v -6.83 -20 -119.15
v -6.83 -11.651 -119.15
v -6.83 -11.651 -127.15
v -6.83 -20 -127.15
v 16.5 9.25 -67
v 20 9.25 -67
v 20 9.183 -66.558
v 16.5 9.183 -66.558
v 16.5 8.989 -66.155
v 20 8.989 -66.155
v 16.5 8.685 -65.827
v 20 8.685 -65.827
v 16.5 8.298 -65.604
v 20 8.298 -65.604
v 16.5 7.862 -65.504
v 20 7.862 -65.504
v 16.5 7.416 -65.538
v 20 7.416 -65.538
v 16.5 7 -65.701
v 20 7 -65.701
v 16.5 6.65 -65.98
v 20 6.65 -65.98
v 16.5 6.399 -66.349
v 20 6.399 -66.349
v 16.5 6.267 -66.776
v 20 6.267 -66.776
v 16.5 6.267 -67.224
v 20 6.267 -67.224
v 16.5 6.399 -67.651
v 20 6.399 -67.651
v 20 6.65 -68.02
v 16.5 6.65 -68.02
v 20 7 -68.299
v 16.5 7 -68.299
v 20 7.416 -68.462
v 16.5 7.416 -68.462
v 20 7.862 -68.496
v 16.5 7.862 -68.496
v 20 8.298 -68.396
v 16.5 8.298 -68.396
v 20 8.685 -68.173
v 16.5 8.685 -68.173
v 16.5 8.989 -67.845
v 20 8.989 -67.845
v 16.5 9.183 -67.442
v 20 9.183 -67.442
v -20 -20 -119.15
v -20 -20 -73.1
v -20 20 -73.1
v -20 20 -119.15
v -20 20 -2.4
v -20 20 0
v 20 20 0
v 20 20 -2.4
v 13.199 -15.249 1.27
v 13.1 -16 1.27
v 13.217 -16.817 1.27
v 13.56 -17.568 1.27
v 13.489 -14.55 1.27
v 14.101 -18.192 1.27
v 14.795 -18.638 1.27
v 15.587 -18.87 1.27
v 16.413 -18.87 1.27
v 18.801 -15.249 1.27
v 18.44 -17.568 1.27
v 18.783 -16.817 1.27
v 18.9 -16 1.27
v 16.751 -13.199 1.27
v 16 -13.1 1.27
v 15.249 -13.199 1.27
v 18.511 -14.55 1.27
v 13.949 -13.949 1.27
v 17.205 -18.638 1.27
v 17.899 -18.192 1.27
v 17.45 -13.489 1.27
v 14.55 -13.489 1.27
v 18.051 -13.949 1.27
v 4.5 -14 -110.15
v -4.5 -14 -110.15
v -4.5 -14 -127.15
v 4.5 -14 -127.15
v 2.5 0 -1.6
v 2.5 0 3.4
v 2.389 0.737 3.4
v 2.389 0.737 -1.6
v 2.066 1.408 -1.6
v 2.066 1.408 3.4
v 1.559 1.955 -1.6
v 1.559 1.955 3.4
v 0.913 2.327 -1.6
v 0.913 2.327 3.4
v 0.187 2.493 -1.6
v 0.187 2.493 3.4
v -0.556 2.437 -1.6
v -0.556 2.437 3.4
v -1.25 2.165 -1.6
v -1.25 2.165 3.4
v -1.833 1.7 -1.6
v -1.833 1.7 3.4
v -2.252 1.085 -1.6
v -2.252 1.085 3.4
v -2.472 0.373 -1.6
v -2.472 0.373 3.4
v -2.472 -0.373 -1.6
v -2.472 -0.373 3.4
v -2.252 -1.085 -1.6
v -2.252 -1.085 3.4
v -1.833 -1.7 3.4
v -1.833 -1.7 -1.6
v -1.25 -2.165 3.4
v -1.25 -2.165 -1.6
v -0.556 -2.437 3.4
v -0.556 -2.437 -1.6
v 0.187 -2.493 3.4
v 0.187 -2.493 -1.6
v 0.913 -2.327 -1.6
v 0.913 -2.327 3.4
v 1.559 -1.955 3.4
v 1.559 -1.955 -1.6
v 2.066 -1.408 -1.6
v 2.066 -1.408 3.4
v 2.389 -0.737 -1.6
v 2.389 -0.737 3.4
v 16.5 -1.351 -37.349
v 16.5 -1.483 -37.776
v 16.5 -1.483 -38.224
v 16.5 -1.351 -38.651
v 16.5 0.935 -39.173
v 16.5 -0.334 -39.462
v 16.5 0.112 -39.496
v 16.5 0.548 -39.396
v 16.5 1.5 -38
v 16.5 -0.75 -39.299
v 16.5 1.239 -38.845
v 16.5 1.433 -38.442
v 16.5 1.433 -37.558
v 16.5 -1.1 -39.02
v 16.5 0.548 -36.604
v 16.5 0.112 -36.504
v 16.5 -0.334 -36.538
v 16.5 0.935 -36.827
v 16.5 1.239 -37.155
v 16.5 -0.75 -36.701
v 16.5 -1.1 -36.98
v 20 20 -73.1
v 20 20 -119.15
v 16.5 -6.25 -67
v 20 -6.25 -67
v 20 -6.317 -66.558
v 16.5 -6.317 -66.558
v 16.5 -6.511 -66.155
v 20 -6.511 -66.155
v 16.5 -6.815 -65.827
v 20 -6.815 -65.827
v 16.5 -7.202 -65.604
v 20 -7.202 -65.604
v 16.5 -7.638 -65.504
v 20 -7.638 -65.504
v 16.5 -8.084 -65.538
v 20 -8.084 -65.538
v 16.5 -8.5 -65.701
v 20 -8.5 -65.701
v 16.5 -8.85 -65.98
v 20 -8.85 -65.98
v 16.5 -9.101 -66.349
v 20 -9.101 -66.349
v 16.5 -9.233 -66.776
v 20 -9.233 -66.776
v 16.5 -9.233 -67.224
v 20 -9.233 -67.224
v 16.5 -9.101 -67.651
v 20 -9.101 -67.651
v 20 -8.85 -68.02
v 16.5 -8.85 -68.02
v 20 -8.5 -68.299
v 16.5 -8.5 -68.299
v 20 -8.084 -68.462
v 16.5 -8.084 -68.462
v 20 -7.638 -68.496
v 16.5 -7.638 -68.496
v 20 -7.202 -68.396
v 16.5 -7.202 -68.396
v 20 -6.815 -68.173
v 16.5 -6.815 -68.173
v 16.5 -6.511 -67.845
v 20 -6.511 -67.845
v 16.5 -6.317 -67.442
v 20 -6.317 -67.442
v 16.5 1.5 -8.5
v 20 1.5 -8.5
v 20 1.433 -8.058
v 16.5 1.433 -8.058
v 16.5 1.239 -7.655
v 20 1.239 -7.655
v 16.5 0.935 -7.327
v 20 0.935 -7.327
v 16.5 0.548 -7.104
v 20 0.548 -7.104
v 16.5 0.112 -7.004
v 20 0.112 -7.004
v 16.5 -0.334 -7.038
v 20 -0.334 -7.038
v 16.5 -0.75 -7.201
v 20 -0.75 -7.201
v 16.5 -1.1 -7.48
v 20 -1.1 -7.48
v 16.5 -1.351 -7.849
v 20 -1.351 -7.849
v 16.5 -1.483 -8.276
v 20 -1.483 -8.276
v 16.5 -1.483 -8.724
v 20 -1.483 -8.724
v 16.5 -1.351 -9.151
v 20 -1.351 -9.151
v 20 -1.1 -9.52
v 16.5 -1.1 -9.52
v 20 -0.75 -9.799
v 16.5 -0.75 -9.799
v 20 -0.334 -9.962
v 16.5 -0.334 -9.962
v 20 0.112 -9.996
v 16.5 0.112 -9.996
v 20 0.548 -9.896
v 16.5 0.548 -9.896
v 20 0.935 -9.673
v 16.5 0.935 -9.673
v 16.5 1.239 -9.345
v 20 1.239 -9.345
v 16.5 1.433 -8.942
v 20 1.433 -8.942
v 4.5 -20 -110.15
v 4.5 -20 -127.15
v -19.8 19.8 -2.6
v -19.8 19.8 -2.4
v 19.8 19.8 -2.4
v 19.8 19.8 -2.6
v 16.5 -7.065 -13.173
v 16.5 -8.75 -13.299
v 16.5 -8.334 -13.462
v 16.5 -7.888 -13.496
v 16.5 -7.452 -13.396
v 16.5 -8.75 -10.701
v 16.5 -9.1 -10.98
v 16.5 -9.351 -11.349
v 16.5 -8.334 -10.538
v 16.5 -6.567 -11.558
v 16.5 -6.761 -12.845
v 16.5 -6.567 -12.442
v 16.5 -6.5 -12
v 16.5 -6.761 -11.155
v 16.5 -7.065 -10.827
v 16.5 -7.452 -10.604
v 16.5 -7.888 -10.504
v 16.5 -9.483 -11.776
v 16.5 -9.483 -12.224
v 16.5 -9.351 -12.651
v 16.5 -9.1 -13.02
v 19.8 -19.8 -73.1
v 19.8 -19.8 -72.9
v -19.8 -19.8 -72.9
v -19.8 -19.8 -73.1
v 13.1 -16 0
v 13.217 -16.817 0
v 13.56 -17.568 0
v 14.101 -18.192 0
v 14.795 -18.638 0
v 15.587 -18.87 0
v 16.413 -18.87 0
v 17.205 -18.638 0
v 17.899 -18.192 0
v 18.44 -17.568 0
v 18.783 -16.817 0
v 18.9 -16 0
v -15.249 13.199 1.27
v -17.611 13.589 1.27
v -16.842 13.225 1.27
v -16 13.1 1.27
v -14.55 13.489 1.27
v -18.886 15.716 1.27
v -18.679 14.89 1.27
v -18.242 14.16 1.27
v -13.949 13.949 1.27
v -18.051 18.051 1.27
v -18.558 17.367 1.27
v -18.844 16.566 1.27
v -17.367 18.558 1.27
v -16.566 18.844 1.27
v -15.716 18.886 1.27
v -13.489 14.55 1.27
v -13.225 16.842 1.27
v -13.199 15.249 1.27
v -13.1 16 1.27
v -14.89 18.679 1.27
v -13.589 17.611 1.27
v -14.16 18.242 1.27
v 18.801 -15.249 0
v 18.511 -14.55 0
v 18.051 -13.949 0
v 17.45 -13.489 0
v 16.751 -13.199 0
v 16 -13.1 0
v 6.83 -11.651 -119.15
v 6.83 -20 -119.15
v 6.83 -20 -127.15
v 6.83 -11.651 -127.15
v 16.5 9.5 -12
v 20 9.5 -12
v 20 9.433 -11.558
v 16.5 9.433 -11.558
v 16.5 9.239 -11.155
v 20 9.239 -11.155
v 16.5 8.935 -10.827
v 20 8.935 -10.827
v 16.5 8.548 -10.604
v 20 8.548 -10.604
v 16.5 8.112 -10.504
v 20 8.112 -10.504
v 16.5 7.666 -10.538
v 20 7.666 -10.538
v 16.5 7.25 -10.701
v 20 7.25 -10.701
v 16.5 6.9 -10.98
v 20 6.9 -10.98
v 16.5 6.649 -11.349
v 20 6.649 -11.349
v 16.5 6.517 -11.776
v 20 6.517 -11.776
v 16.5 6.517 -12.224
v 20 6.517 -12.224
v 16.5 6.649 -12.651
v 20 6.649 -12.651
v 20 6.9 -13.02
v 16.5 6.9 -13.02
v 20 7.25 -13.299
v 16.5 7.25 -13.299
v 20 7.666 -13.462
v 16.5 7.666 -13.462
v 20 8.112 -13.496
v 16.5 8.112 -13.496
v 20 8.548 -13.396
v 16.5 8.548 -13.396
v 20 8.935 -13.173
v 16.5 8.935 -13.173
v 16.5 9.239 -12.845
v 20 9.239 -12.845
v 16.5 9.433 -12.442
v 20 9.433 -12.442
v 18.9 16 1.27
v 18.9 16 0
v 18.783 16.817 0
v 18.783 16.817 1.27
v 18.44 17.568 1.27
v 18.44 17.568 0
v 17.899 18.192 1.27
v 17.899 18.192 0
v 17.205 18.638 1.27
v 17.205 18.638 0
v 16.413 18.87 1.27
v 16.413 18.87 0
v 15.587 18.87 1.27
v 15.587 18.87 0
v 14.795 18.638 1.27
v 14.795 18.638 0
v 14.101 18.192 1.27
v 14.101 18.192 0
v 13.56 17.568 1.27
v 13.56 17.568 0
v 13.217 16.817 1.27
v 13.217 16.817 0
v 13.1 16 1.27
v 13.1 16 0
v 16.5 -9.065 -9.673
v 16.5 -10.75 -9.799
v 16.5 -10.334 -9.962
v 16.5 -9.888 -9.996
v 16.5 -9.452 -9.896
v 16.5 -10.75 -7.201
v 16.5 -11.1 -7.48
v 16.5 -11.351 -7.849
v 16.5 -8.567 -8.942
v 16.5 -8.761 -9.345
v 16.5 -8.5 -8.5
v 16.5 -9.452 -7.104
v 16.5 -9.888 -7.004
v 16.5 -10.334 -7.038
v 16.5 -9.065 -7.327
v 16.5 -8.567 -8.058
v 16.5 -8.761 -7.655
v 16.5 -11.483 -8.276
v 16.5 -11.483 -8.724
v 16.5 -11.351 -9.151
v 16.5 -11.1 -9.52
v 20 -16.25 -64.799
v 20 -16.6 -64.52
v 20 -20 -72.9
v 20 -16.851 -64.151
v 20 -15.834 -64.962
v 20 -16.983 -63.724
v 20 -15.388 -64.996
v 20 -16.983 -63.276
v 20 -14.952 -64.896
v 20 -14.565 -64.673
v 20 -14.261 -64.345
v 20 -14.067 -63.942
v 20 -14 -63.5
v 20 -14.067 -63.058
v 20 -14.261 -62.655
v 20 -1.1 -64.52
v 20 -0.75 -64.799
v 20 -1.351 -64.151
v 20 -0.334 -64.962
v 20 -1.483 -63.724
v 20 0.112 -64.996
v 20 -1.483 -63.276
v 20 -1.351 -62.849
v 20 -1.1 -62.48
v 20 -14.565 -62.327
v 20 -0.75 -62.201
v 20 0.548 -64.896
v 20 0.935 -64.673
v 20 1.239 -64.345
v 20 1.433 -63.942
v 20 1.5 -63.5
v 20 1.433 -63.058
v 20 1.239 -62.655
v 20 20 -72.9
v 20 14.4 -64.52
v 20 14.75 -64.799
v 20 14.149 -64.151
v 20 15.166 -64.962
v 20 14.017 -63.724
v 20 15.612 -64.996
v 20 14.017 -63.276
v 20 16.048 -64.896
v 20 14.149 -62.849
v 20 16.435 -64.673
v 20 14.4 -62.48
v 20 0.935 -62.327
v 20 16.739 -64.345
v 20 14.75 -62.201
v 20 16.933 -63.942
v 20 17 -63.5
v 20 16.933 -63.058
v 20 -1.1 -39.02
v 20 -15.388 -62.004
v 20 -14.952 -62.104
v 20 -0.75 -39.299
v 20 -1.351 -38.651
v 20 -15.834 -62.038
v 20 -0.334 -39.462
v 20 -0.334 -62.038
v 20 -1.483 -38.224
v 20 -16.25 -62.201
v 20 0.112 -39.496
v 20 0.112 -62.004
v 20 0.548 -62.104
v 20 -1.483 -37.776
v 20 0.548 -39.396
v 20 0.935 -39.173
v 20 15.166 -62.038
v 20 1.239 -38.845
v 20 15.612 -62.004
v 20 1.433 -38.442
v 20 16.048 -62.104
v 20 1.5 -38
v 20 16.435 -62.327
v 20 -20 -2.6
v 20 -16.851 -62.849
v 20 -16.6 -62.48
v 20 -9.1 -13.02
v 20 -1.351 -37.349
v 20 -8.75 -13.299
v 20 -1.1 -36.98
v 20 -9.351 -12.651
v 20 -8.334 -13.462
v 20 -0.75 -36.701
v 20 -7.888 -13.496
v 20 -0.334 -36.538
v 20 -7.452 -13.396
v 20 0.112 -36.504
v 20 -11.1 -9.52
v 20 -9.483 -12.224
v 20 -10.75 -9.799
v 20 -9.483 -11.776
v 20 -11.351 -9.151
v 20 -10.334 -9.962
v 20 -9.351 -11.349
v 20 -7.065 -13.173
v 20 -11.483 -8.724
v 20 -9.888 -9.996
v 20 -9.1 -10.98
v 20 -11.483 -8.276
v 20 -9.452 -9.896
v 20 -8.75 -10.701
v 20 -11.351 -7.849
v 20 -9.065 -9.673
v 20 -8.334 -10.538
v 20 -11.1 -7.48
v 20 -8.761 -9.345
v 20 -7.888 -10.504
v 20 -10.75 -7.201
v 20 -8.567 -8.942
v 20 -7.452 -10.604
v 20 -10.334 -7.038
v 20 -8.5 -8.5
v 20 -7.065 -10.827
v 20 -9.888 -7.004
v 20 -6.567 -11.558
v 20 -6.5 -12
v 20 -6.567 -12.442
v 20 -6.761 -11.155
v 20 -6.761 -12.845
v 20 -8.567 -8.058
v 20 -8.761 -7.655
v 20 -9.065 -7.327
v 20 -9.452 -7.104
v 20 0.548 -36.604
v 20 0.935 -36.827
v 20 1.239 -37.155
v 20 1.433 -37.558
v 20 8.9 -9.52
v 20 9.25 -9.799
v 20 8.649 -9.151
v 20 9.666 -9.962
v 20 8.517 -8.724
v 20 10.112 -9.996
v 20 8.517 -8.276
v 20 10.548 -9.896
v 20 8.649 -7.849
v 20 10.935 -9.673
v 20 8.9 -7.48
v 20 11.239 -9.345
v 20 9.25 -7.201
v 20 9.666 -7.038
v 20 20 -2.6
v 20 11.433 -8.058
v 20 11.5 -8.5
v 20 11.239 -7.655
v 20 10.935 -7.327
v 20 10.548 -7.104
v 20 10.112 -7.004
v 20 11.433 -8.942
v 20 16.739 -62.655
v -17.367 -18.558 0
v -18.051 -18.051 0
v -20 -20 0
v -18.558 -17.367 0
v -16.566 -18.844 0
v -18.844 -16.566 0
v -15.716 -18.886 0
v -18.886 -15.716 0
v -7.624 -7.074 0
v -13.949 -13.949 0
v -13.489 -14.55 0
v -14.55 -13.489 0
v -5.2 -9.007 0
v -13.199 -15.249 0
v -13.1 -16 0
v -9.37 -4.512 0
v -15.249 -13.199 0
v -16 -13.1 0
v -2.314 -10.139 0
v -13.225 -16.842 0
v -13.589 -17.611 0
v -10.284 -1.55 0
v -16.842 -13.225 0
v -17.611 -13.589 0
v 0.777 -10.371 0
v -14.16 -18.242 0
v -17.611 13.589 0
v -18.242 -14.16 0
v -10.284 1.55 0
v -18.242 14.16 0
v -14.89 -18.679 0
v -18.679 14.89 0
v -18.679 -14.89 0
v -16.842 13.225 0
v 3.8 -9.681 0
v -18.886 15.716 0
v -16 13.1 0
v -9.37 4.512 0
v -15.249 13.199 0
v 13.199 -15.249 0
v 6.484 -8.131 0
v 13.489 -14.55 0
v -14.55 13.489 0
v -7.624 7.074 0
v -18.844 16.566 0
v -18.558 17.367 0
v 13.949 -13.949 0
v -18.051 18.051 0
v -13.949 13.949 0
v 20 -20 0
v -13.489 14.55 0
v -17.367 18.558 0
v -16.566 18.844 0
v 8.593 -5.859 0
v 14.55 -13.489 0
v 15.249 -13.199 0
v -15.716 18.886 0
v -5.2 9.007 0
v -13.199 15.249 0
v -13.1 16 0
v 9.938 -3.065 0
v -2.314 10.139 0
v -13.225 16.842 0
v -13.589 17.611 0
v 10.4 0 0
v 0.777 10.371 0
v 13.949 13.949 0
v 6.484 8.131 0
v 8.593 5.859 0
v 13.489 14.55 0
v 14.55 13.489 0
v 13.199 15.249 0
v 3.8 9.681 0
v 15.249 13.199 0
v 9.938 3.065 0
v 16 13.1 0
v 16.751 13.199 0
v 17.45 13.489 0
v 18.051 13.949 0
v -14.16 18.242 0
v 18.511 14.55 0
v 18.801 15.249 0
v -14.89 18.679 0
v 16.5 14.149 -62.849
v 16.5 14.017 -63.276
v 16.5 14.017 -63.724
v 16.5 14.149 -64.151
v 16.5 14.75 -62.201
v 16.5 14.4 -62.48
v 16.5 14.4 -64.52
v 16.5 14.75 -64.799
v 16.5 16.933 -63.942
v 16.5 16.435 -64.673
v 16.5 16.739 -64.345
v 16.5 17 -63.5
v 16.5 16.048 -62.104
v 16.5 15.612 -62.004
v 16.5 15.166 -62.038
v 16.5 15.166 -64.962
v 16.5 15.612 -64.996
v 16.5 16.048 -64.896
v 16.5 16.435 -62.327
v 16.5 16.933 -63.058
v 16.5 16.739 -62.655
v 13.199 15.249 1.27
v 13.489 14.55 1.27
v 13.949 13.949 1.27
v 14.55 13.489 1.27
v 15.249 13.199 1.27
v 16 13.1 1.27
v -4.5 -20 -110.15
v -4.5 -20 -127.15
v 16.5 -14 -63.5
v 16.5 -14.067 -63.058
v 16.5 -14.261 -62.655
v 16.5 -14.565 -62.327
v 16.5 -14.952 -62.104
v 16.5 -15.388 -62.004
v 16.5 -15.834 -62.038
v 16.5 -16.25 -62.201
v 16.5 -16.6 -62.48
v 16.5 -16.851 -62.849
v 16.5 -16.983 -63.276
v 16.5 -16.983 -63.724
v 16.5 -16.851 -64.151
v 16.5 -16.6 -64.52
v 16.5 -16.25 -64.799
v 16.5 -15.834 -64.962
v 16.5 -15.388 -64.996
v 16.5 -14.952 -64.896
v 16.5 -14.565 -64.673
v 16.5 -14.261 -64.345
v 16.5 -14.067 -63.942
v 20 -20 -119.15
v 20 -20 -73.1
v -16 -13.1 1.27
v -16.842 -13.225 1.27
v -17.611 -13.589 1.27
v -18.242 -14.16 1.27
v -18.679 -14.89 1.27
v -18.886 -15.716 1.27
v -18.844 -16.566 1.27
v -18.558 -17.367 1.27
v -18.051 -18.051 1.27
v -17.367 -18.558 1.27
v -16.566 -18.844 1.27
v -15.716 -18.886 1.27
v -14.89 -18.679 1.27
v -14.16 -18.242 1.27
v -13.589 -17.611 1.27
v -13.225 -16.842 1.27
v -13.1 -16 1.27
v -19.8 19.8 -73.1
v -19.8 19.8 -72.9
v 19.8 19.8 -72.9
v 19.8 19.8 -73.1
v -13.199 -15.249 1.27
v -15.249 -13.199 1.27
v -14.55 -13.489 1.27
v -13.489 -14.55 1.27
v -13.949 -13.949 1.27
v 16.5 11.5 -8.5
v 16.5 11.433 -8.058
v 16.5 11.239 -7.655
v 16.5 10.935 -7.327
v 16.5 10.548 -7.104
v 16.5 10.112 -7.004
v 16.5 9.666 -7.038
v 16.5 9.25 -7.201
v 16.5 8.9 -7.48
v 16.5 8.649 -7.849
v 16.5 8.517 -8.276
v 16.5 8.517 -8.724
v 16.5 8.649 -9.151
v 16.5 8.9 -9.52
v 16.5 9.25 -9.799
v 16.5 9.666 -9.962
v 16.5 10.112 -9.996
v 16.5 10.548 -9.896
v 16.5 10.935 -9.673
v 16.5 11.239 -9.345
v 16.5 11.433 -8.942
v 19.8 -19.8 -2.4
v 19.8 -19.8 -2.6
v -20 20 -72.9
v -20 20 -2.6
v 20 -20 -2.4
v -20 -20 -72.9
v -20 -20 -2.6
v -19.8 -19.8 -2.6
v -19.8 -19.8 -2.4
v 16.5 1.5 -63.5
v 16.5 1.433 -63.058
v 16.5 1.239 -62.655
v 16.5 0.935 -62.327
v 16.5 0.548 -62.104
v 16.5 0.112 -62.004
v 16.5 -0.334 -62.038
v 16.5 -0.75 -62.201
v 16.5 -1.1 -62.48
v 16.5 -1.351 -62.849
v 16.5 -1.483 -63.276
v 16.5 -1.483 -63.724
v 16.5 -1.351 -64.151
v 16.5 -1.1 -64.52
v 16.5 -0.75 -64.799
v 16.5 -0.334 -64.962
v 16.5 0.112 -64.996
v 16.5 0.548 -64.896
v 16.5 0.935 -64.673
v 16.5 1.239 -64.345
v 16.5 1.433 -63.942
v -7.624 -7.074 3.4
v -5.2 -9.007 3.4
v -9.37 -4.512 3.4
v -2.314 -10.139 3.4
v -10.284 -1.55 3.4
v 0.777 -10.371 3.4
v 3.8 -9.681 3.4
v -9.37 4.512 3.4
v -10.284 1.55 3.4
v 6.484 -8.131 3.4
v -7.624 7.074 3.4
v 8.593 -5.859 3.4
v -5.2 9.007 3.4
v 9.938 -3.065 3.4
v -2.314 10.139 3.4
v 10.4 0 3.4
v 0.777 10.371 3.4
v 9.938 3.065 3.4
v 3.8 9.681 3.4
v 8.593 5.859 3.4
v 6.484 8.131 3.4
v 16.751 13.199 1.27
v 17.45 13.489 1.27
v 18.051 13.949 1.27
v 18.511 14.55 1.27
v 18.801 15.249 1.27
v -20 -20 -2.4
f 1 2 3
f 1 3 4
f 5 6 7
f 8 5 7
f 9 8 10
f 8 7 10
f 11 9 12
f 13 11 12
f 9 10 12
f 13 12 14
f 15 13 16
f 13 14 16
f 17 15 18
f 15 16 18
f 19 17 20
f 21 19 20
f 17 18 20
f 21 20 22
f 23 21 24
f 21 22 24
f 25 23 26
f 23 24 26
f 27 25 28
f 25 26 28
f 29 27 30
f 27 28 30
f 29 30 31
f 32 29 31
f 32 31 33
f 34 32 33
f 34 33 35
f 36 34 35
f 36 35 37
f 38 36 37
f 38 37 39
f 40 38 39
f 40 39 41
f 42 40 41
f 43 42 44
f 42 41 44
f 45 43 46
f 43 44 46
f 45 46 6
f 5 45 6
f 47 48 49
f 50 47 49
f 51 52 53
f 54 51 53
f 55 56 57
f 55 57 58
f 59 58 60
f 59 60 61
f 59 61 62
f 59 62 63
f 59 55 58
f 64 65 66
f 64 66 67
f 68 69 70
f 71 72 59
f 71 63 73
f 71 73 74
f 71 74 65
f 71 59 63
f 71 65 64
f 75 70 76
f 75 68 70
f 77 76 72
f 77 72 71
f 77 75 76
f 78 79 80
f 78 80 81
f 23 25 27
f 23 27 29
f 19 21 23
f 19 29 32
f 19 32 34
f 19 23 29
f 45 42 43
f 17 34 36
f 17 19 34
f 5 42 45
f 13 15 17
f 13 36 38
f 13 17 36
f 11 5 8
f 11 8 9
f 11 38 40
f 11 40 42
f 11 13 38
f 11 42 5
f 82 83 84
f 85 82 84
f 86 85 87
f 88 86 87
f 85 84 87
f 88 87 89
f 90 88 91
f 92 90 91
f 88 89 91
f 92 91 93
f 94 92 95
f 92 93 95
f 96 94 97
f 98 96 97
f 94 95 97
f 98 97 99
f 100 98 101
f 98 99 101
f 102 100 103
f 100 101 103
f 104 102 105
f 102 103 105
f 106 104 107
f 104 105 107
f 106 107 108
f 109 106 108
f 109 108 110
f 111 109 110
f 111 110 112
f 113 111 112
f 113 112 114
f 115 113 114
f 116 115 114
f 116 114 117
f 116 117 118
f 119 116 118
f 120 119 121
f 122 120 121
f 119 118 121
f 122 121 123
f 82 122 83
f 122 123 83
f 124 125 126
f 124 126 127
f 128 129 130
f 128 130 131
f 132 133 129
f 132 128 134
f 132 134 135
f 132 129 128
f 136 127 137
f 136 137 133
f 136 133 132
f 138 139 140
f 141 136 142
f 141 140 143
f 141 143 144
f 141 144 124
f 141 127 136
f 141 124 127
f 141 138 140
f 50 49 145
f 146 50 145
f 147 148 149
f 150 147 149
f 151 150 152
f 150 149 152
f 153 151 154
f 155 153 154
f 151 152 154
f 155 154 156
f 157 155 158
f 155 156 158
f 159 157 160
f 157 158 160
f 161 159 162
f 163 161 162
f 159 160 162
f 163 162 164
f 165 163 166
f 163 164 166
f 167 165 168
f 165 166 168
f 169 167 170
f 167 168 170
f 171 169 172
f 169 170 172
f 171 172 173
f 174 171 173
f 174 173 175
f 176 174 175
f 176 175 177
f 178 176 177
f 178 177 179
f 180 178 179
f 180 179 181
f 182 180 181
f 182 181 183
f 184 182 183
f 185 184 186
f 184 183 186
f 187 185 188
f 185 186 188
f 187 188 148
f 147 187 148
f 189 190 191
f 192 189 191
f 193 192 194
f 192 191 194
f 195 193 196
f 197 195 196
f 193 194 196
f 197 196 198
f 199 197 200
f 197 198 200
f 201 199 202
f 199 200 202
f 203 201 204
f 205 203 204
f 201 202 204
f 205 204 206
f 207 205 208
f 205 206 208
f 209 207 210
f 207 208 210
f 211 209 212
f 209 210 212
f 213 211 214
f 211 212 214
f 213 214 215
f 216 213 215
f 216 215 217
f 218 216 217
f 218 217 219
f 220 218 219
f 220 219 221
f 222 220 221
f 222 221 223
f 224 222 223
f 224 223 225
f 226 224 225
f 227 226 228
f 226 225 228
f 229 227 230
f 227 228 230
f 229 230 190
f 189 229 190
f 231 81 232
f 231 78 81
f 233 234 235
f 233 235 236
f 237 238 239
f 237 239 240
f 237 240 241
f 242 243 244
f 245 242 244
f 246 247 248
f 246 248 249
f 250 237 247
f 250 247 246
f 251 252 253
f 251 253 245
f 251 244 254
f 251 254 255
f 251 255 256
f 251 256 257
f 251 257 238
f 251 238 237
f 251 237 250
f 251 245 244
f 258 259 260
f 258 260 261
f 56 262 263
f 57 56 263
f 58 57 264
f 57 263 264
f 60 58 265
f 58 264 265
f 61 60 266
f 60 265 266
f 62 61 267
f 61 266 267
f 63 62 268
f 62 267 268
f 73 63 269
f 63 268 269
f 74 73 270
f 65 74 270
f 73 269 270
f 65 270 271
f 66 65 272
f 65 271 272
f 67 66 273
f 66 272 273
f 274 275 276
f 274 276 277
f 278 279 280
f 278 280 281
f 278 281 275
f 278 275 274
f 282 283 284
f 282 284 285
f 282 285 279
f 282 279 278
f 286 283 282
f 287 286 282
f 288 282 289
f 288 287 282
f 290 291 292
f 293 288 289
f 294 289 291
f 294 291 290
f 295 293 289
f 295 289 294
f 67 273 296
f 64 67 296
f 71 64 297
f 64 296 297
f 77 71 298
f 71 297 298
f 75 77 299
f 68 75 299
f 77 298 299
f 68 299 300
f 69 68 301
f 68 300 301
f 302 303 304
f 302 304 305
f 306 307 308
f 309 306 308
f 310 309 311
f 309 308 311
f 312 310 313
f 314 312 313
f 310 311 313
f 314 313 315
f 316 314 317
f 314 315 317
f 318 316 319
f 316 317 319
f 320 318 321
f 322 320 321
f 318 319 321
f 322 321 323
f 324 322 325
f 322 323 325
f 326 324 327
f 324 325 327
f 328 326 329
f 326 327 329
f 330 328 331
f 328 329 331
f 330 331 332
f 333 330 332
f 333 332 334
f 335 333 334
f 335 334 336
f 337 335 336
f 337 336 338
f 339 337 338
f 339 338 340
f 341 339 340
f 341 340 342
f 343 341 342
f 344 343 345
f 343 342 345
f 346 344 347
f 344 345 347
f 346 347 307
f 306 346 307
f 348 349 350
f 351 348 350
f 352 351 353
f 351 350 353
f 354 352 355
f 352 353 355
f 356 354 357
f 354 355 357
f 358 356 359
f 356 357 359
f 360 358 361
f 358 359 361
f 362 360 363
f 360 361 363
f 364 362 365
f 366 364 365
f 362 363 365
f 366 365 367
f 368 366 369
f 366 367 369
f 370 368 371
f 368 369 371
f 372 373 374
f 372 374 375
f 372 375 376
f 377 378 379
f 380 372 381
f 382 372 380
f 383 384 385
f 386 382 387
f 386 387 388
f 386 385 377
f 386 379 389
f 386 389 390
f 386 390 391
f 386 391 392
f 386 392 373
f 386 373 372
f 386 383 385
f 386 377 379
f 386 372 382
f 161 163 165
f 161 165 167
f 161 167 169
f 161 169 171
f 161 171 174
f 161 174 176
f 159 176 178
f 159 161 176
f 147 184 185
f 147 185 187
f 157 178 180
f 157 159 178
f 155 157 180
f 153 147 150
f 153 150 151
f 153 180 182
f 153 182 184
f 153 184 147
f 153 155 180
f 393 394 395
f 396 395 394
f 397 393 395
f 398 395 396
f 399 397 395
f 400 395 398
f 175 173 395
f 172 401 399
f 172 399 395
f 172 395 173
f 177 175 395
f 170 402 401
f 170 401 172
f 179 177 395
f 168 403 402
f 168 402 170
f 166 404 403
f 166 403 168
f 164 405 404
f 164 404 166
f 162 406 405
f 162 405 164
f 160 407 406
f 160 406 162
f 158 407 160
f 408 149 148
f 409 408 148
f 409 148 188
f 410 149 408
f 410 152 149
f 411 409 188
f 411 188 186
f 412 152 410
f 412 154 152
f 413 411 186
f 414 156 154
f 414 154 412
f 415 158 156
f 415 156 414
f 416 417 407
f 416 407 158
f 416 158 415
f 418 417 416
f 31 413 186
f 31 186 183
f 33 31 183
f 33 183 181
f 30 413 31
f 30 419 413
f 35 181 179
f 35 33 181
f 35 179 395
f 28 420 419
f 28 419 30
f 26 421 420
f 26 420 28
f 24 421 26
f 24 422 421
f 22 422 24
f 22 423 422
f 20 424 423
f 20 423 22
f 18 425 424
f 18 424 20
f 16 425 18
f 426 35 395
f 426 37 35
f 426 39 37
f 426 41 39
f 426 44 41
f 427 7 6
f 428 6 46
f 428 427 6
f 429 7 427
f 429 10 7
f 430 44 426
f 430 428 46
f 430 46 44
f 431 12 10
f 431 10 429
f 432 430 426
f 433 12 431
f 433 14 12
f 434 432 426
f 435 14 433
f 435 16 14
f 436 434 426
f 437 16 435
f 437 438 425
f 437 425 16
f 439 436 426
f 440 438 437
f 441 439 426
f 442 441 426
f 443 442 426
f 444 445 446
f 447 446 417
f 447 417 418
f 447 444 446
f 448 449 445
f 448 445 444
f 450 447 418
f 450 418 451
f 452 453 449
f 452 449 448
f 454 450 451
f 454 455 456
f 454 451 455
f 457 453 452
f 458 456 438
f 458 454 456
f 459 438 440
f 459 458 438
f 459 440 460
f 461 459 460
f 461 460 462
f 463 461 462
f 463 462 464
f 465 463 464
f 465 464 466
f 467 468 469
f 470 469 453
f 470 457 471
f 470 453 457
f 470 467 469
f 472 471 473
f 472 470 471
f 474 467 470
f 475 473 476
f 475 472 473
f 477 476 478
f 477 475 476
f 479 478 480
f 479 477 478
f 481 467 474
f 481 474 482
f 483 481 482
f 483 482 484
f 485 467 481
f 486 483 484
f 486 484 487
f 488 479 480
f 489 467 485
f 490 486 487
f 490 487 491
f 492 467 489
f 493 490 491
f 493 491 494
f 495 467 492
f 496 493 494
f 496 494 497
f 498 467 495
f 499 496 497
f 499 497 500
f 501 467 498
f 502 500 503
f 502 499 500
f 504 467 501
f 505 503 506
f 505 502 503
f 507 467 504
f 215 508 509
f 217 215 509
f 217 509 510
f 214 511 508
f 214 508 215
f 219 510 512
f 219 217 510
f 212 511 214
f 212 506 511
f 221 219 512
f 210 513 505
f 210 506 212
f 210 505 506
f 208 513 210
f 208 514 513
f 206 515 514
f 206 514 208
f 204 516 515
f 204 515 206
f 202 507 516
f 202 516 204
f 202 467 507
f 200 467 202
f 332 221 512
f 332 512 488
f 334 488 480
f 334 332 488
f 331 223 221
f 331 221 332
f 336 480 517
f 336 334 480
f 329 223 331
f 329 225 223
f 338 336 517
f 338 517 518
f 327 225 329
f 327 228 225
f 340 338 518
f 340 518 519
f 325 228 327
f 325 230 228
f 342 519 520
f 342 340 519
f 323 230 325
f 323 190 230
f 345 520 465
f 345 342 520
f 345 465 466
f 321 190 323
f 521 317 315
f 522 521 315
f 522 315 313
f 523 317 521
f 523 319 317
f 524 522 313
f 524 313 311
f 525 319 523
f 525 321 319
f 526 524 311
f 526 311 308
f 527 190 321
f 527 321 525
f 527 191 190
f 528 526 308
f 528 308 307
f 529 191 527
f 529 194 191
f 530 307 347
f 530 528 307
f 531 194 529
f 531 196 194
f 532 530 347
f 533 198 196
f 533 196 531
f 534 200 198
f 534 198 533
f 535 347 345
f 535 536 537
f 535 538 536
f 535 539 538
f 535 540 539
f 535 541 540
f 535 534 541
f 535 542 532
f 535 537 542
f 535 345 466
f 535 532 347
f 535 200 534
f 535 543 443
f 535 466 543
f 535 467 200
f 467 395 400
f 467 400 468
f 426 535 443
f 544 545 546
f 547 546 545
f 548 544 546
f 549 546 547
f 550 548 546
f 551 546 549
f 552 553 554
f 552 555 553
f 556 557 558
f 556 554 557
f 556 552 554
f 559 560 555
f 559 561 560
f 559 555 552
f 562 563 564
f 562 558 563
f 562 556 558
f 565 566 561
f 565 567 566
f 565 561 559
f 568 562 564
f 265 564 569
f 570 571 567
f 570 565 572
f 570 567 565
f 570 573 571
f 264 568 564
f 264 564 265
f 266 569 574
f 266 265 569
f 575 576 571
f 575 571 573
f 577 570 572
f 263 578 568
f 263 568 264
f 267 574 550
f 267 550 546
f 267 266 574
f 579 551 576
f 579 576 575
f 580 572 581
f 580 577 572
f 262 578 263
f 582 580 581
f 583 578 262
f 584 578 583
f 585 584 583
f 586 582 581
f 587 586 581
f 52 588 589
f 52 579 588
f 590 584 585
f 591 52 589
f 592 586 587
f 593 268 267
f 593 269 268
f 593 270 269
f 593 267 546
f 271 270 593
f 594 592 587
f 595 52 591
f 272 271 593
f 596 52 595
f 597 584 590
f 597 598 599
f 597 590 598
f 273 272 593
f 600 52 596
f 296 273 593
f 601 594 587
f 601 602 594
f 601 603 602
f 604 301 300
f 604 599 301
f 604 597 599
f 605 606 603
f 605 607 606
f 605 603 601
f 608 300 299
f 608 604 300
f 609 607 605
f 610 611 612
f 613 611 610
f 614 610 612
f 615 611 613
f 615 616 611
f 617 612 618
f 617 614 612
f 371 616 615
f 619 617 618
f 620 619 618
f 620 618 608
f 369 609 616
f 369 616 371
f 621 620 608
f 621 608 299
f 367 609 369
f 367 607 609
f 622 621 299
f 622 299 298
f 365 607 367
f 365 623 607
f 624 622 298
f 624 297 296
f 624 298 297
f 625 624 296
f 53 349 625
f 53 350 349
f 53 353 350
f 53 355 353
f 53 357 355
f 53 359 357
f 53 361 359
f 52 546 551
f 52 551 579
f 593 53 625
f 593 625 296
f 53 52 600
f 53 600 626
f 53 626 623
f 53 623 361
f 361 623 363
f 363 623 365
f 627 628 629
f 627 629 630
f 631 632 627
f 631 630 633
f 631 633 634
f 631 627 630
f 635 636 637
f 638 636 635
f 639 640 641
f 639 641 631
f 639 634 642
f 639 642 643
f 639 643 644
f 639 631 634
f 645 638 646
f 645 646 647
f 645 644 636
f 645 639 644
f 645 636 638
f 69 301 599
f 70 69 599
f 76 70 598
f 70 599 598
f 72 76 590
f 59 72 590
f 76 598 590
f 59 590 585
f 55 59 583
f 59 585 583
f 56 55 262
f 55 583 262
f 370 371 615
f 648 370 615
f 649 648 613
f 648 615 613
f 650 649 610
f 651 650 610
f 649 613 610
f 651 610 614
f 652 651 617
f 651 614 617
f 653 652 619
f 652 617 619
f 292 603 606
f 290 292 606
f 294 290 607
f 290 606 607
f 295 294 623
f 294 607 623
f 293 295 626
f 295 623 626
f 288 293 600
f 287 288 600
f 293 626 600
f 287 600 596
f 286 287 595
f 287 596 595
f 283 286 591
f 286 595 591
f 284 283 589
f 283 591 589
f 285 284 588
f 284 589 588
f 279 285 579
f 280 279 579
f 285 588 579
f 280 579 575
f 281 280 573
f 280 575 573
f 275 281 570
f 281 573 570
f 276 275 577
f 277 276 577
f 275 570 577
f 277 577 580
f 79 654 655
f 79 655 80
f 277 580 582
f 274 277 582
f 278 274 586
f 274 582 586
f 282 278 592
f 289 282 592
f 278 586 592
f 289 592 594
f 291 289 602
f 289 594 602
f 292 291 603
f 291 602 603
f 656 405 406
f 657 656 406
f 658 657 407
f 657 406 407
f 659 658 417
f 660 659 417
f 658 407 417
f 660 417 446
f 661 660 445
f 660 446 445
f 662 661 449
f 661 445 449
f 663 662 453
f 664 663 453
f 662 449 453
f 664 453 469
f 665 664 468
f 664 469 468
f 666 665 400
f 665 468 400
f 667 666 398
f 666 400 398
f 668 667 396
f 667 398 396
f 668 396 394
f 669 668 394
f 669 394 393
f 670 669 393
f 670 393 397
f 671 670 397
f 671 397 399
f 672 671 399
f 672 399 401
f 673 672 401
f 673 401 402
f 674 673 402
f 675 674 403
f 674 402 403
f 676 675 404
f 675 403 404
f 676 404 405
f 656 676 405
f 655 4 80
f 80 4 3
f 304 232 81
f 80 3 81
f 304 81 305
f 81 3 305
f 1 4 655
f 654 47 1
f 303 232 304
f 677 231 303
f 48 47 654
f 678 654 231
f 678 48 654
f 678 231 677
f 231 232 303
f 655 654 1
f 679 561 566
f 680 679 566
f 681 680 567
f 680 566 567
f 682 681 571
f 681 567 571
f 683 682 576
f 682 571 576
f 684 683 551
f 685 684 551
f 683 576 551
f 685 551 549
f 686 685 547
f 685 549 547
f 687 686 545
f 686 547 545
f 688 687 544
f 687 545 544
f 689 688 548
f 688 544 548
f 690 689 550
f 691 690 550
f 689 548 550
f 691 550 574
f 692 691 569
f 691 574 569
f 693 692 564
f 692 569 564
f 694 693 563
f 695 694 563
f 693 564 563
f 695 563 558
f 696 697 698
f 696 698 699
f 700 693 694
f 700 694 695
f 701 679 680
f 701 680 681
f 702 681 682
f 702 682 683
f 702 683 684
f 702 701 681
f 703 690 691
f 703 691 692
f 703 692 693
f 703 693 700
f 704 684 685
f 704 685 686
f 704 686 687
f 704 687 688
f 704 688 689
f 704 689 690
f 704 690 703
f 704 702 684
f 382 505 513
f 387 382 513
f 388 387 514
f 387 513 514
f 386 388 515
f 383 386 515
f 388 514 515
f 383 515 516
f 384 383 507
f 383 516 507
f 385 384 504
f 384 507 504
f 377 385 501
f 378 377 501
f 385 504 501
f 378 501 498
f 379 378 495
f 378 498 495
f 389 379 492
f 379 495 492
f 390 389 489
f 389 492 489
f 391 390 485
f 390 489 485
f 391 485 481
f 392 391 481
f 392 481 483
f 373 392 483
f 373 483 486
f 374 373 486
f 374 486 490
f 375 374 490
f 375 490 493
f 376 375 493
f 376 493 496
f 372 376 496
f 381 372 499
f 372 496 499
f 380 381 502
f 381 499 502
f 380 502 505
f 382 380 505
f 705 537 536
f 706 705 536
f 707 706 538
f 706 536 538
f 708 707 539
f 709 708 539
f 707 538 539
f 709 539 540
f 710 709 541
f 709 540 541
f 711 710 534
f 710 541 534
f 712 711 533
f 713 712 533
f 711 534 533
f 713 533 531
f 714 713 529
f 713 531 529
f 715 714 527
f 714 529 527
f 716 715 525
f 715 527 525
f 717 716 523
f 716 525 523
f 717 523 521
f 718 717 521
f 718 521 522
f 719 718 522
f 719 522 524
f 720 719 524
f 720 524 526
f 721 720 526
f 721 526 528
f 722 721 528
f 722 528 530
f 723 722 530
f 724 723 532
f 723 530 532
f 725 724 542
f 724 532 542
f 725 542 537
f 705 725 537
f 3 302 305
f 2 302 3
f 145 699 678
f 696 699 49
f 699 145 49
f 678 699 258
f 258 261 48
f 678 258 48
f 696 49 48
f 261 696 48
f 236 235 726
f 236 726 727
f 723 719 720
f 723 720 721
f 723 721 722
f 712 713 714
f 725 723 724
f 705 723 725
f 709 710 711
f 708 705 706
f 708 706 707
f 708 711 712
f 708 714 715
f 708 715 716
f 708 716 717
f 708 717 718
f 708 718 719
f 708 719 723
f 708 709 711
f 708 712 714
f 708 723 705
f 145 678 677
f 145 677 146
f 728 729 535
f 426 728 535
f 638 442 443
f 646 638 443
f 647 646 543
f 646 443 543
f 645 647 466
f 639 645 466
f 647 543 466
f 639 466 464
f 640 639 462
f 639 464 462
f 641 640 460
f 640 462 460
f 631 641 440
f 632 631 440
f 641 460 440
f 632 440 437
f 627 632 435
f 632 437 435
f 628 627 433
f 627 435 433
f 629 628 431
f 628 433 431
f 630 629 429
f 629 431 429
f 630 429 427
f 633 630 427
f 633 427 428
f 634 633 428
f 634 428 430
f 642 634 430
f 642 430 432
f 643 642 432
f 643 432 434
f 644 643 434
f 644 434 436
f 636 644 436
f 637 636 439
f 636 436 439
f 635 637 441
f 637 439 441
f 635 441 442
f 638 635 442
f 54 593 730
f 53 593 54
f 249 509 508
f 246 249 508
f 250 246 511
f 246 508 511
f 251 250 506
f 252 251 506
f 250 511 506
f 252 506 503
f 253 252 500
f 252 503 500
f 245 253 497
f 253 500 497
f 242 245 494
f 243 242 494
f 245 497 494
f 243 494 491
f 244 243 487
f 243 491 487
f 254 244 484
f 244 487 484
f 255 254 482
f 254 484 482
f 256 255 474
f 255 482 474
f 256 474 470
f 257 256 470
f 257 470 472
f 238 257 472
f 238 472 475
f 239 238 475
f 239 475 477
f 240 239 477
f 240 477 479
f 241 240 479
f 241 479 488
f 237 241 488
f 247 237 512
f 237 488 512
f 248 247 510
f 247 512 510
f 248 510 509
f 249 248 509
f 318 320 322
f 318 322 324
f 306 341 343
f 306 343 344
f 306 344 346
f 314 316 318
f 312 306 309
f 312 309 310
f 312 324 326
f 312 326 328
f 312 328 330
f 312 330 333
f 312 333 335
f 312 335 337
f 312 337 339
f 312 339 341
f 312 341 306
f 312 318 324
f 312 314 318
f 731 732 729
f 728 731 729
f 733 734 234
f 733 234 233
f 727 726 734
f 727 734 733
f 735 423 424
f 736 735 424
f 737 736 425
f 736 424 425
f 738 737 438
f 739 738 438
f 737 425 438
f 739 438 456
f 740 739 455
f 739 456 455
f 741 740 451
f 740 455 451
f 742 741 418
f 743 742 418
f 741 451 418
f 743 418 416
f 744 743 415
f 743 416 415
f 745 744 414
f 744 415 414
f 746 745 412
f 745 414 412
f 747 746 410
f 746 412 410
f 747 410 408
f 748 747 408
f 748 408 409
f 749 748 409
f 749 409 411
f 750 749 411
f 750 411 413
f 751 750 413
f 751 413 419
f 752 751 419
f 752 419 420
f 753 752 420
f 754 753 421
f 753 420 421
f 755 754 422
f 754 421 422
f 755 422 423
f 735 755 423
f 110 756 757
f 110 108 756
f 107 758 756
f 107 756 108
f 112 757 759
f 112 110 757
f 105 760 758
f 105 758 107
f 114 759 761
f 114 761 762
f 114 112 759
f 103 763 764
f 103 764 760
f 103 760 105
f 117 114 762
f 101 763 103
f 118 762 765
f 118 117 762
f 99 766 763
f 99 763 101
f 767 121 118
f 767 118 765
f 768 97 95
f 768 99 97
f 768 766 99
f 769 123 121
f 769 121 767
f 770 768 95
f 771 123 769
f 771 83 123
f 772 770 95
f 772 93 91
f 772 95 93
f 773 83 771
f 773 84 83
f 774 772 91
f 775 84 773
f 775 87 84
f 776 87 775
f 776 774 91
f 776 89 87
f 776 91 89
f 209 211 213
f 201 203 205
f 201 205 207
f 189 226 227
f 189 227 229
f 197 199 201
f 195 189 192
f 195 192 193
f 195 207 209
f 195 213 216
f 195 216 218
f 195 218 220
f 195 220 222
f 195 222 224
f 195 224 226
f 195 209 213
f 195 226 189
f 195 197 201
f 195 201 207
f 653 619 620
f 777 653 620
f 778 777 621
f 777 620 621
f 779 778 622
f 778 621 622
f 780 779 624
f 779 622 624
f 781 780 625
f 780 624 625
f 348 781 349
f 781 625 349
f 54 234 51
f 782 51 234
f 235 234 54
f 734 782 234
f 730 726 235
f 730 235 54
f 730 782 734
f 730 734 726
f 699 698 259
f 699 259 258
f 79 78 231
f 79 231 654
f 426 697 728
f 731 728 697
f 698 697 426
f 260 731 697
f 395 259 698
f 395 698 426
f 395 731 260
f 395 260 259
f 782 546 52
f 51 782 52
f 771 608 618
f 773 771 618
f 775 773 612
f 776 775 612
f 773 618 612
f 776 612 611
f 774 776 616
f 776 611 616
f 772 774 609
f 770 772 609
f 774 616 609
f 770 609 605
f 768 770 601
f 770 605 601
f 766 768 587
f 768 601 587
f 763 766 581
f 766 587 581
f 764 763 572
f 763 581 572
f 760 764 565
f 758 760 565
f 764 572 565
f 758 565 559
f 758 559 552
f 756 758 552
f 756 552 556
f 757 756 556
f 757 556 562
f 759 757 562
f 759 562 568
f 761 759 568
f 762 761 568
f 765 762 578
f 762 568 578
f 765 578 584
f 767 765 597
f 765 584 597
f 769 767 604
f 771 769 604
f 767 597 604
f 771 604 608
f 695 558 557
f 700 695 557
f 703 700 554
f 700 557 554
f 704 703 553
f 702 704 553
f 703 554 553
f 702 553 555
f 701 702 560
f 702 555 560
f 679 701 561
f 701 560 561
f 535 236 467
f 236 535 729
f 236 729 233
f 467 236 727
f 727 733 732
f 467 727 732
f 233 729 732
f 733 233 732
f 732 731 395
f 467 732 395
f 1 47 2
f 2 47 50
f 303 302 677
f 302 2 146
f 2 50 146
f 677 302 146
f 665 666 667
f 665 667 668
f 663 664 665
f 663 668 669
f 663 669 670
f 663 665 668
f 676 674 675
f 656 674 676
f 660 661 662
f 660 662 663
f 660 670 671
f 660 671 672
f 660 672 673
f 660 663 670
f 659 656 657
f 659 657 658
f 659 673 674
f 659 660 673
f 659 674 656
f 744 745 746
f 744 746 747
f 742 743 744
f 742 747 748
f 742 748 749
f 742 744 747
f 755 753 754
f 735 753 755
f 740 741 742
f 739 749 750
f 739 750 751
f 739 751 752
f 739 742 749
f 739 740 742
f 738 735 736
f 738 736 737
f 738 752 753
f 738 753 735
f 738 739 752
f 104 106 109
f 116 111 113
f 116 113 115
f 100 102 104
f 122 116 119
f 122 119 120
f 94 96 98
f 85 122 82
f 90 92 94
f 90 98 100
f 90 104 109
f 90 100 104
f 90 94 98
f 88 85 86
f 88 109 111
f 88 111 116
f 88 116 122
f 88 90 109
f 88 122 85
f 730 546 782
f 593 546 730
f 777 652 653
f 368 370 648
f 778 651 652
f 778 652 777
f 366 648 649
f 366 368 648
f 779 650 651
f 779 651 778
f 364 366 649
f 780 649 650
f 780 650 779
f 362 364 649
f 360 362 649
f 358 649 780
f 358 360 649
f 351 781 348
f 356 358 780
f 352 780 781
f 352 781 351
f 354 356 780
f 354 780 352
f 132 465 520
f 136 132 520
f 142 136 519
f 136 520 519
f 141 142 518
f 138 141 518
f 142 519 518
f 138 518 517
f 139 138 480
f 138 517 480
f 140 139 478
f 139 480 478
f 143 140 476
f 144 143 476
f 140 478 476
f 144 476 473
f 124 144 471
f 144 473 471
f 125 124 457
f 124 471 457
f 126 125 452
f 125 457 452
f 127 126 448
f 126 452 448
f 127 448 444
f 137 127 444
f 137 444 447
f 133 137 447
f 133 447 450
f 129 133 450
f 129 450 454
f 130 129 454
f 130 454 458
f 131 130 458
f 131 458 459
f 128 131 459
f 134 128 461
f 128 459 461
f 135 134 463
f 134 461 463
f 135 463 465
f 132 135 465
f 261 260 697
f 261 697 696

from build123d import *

# Parameters (mm, degrees)
CROQUIS1_W              = 40
CROQUIS1_H              = 40
SALIENTE_EXTRUIR1_DEPTH = 119.15
CROQUIS2_R              = 10.4
SALIENTE_EXTRUIR2_DEPTH = 3.4
SALIENTE_EXTRUIR3_DEPTH = 1.27
CROQUIS4_R              = 2.5
CORTAR_EXTRUIR1_DEPTH   = 5
CROQUIS5_W              = 9
CROQUIS5_H              = 6
CORTAR_EXTRUIR2_DEPTH   = 9
CROQUIS6_R              = 1.5
CORTAR_EXTRUIR3_DEPTH   = 3.5
SALIENTE_EXTRUIR4_DEPTH = 8
CROQUIS10_W             = 0.2
CROQUIS10_H             = 40
CORTAR_EXTRUIR4_DEPTH   = 0.2
MATRIZC1_COUNT          = 4


with BuildPart() as part:
    # Croquis1 → Saliente-Extruir1 (new body)
    with BuildSketch(Plane.XY):
        Rectangle(CROQUIS1_W, CROQUIS1_H)
    extrude(amount=-SALIENTE_EXTRUIR1_DEPTH)

    # Croquis2 → Saliente-Extruir2 (add)
    with BuildSketch(Plane.XY):
        Circle(CROQUIS2_R)
    extrude(amount=SALIENTE_EXTRUIR2_DEPTH)

    # Croquis3 → Saliente-Extruir3 (add)
    with BuildSketch(Plane.XY):
        with BuildLine():
            Line((-16, 13.1), (-16, 16))
            Line((-16, 16), (-13.1, 16))
            ThreePointArc((-13.1, 16), (-18.050609665, 18.050609665), (-16, 13.1))
        make_face()
        with BuildLine():
            Line((-13.1, 16), (-16, 16))
            Line((-16, 16), (-16, 13.1))
            ThreePointArc((-16, 13.1), (-13.949390335, 13.949390335), (-13.1, 16))
        make_face()
        with BuildLine():
            ThreePointArc((18.9, 16), (16, 18.9), (13.1, 16))
            Line((13.1, 16), (16, 16))
            Line((16, 16), (16, 13.1))
            ThreePointArc((16, 13.1), (18.050609665, 13.949390335), (18.9, 16))
        make_face()
        with BuildLine():
            Line((16, 16), (13.1, 16))
            ThreePointArc((13.1, 16), (13.949390335, 13.949390335), (16, 13.1))
            Line((16, 13.1), (16, 16))
        make_face()
        with BuildLine():
            ThreePointArc((-13.1, -16), (-13.949390335, -13.949390335), (-16, -13.1))
            Line((-16, -13.1), (-16, -16))
            Line((-16, -16), (-13.1, -16))
        make_face()
        with BuildLine():
            Line((-16, -16), (-16, -13.1))
            ThreePointArc((-16, -13.1), (-18.050609665, -18.050609665), (-13.1, -16))
            Line((-13.1, -16), (-16, -16))
        make_face()
        with BuildLine():
            ThreePointArc((18.9, -16), (18.050609665, -13.949390335), (16, -13.1))
            Line((16, -13.1), (16, -16))
            Line((16, -16), (13.1, -16))
            ThreePointArc((13.1, -16), (16, -18.9), (18.9, -16))
        make_face()
        with BuildLine():
            Line((16, -16), (16, -13.1))
            ThreePointArc((16, -13.1), (13.949390335, -13.949390335), (13.1, -16))
            Line((13.1, -16), (16, -16))
        make_face()
    extrude(amount=SALIENTE_EXTRUIR3_DEPTH)

    # Croquis4 → Cortar-Extruir1 (cut)
    with BuildSketch(Plane.XY.offset(3.4)):
        Circle(CROQUIS4_R)
    extrude(amount=-CORTAR_EXTRUIR1_DEPTH, mode=Mode.SUBTRACT)

    # Croquis5 → Cortar-Extruir2 (cut)
    with BuildSketch(Plane(origin=(0, 0, -119.15), x_dir=(-1, 0, 0), z_dir=(0, 0, -1))):
        with Locations((0, -17)):
            Rectangle(CROQUIS5_W, CROQUIS5_H)
    extrude(amount=-CORTAR_EXTRUIR2_DEPTH, mode=Mode.SUBTRACT)

    # Croquis6 → Cortar-Extruir3 (cut)
    with BuildSketch(Plane(origin=(20, 0, 0), x_dir=(0, 0, -1), z_dir=(1, 0, 0))):
        with Locations(Location((38, 0, 0), (0, 0, 90))):
            Circle(CROQUIS6_R)
        with Locations(Location((8.5, 0, 0), (0, 0, 90))):
            Circle(CROQUIS6_R)
        with Locations(Location((63.5, 0, 0), (0, 0, 90))):
            Circle(CROQUIS6_R)
        with Locations(Location((12, 8, 0), (0, 0, 90))):
            Circle(CROQUIS6_R)
        with Locations(Location((12, -8, 0), (0, 0, 90))):
            Circle(CROQUIS6_R)
        with Locations(Location((8.5, -10, 0), (0, 0, 90))):
            Circle(CROQUIS6_R)
        with Locations(Location((8.5, 10, 0), (0, 0, 90))):
            Circle(CROQUIS6_R)
        with Locations(Location((67, -7.75, 0), (0, 0, 90))):
            Circle(CROQUIS6_R)
        with Locations(Location((63.5, -15.5, 0), (0, 0, 90))):
            Circle(CROQUIS6_R)
        with Locations(Location((67, 7.75, 0), (0, 0, 90))):
            Circle(CROQUIS6_R)
        with Locations(Location((63.5, 15.5, 0), (0, 0, 90))):
            Circle(CROQUIS6_R)
    extrude(amount=-CORTAR_EXTRUIR3_DEPTH, mode=Mode.SUBTRACT)

    # Croquis9 → Saliente-Extruir4 (add)
    with BuildSketch(Plane(origin=(0, 0, -119.15), x_dir=(-1, 0, 0), z_dir=(0, 0, -1))):
        Polygon((-6.829794284, -20), (-6.829794284, -11.650544172), (6.829794284, -11.650544172), (6.829794284, -20), (4.5, -20), (4.5, -14), (-4.5, -14), (-4.5, -20), align=None)
    extrude(amount=SALIENTE_EXTRUIR4_DEPTH)

    # Croquis10 → Cortar-Extruir4 (cut)
    with BuildSketch(Plane(origin=(20, 0, 0), x_dir=(0, 0, -1), z_dir=(1, 0, 0))):
        with Locations((73, 0)):
            Rectangle(CROQUIS10_W, CROQUIS10_H)
        with Locations((2.5, 0)):
            Rectangle(CROQUIS10_W, CROQUIS10_H)
    cortar_extruir4 = extrude(amount=-CORTAR_EXTRUIR4_DEPTH, mode=Mode.SUBTRACT)

    # MatrizC1: Cortar-Extruir4 ×4 about axis
    matrizc1_axis = Axis((0, 0, 0), (0, 0, 1))
    for i in range(1, MATRIZC1_COUNT):
        add(cortar_extruir4.rotate(matrizc1_axis, i * 360 / MATRIZC1_COUNT), mode=Mode.SUBTRACT)


solid = part.part
